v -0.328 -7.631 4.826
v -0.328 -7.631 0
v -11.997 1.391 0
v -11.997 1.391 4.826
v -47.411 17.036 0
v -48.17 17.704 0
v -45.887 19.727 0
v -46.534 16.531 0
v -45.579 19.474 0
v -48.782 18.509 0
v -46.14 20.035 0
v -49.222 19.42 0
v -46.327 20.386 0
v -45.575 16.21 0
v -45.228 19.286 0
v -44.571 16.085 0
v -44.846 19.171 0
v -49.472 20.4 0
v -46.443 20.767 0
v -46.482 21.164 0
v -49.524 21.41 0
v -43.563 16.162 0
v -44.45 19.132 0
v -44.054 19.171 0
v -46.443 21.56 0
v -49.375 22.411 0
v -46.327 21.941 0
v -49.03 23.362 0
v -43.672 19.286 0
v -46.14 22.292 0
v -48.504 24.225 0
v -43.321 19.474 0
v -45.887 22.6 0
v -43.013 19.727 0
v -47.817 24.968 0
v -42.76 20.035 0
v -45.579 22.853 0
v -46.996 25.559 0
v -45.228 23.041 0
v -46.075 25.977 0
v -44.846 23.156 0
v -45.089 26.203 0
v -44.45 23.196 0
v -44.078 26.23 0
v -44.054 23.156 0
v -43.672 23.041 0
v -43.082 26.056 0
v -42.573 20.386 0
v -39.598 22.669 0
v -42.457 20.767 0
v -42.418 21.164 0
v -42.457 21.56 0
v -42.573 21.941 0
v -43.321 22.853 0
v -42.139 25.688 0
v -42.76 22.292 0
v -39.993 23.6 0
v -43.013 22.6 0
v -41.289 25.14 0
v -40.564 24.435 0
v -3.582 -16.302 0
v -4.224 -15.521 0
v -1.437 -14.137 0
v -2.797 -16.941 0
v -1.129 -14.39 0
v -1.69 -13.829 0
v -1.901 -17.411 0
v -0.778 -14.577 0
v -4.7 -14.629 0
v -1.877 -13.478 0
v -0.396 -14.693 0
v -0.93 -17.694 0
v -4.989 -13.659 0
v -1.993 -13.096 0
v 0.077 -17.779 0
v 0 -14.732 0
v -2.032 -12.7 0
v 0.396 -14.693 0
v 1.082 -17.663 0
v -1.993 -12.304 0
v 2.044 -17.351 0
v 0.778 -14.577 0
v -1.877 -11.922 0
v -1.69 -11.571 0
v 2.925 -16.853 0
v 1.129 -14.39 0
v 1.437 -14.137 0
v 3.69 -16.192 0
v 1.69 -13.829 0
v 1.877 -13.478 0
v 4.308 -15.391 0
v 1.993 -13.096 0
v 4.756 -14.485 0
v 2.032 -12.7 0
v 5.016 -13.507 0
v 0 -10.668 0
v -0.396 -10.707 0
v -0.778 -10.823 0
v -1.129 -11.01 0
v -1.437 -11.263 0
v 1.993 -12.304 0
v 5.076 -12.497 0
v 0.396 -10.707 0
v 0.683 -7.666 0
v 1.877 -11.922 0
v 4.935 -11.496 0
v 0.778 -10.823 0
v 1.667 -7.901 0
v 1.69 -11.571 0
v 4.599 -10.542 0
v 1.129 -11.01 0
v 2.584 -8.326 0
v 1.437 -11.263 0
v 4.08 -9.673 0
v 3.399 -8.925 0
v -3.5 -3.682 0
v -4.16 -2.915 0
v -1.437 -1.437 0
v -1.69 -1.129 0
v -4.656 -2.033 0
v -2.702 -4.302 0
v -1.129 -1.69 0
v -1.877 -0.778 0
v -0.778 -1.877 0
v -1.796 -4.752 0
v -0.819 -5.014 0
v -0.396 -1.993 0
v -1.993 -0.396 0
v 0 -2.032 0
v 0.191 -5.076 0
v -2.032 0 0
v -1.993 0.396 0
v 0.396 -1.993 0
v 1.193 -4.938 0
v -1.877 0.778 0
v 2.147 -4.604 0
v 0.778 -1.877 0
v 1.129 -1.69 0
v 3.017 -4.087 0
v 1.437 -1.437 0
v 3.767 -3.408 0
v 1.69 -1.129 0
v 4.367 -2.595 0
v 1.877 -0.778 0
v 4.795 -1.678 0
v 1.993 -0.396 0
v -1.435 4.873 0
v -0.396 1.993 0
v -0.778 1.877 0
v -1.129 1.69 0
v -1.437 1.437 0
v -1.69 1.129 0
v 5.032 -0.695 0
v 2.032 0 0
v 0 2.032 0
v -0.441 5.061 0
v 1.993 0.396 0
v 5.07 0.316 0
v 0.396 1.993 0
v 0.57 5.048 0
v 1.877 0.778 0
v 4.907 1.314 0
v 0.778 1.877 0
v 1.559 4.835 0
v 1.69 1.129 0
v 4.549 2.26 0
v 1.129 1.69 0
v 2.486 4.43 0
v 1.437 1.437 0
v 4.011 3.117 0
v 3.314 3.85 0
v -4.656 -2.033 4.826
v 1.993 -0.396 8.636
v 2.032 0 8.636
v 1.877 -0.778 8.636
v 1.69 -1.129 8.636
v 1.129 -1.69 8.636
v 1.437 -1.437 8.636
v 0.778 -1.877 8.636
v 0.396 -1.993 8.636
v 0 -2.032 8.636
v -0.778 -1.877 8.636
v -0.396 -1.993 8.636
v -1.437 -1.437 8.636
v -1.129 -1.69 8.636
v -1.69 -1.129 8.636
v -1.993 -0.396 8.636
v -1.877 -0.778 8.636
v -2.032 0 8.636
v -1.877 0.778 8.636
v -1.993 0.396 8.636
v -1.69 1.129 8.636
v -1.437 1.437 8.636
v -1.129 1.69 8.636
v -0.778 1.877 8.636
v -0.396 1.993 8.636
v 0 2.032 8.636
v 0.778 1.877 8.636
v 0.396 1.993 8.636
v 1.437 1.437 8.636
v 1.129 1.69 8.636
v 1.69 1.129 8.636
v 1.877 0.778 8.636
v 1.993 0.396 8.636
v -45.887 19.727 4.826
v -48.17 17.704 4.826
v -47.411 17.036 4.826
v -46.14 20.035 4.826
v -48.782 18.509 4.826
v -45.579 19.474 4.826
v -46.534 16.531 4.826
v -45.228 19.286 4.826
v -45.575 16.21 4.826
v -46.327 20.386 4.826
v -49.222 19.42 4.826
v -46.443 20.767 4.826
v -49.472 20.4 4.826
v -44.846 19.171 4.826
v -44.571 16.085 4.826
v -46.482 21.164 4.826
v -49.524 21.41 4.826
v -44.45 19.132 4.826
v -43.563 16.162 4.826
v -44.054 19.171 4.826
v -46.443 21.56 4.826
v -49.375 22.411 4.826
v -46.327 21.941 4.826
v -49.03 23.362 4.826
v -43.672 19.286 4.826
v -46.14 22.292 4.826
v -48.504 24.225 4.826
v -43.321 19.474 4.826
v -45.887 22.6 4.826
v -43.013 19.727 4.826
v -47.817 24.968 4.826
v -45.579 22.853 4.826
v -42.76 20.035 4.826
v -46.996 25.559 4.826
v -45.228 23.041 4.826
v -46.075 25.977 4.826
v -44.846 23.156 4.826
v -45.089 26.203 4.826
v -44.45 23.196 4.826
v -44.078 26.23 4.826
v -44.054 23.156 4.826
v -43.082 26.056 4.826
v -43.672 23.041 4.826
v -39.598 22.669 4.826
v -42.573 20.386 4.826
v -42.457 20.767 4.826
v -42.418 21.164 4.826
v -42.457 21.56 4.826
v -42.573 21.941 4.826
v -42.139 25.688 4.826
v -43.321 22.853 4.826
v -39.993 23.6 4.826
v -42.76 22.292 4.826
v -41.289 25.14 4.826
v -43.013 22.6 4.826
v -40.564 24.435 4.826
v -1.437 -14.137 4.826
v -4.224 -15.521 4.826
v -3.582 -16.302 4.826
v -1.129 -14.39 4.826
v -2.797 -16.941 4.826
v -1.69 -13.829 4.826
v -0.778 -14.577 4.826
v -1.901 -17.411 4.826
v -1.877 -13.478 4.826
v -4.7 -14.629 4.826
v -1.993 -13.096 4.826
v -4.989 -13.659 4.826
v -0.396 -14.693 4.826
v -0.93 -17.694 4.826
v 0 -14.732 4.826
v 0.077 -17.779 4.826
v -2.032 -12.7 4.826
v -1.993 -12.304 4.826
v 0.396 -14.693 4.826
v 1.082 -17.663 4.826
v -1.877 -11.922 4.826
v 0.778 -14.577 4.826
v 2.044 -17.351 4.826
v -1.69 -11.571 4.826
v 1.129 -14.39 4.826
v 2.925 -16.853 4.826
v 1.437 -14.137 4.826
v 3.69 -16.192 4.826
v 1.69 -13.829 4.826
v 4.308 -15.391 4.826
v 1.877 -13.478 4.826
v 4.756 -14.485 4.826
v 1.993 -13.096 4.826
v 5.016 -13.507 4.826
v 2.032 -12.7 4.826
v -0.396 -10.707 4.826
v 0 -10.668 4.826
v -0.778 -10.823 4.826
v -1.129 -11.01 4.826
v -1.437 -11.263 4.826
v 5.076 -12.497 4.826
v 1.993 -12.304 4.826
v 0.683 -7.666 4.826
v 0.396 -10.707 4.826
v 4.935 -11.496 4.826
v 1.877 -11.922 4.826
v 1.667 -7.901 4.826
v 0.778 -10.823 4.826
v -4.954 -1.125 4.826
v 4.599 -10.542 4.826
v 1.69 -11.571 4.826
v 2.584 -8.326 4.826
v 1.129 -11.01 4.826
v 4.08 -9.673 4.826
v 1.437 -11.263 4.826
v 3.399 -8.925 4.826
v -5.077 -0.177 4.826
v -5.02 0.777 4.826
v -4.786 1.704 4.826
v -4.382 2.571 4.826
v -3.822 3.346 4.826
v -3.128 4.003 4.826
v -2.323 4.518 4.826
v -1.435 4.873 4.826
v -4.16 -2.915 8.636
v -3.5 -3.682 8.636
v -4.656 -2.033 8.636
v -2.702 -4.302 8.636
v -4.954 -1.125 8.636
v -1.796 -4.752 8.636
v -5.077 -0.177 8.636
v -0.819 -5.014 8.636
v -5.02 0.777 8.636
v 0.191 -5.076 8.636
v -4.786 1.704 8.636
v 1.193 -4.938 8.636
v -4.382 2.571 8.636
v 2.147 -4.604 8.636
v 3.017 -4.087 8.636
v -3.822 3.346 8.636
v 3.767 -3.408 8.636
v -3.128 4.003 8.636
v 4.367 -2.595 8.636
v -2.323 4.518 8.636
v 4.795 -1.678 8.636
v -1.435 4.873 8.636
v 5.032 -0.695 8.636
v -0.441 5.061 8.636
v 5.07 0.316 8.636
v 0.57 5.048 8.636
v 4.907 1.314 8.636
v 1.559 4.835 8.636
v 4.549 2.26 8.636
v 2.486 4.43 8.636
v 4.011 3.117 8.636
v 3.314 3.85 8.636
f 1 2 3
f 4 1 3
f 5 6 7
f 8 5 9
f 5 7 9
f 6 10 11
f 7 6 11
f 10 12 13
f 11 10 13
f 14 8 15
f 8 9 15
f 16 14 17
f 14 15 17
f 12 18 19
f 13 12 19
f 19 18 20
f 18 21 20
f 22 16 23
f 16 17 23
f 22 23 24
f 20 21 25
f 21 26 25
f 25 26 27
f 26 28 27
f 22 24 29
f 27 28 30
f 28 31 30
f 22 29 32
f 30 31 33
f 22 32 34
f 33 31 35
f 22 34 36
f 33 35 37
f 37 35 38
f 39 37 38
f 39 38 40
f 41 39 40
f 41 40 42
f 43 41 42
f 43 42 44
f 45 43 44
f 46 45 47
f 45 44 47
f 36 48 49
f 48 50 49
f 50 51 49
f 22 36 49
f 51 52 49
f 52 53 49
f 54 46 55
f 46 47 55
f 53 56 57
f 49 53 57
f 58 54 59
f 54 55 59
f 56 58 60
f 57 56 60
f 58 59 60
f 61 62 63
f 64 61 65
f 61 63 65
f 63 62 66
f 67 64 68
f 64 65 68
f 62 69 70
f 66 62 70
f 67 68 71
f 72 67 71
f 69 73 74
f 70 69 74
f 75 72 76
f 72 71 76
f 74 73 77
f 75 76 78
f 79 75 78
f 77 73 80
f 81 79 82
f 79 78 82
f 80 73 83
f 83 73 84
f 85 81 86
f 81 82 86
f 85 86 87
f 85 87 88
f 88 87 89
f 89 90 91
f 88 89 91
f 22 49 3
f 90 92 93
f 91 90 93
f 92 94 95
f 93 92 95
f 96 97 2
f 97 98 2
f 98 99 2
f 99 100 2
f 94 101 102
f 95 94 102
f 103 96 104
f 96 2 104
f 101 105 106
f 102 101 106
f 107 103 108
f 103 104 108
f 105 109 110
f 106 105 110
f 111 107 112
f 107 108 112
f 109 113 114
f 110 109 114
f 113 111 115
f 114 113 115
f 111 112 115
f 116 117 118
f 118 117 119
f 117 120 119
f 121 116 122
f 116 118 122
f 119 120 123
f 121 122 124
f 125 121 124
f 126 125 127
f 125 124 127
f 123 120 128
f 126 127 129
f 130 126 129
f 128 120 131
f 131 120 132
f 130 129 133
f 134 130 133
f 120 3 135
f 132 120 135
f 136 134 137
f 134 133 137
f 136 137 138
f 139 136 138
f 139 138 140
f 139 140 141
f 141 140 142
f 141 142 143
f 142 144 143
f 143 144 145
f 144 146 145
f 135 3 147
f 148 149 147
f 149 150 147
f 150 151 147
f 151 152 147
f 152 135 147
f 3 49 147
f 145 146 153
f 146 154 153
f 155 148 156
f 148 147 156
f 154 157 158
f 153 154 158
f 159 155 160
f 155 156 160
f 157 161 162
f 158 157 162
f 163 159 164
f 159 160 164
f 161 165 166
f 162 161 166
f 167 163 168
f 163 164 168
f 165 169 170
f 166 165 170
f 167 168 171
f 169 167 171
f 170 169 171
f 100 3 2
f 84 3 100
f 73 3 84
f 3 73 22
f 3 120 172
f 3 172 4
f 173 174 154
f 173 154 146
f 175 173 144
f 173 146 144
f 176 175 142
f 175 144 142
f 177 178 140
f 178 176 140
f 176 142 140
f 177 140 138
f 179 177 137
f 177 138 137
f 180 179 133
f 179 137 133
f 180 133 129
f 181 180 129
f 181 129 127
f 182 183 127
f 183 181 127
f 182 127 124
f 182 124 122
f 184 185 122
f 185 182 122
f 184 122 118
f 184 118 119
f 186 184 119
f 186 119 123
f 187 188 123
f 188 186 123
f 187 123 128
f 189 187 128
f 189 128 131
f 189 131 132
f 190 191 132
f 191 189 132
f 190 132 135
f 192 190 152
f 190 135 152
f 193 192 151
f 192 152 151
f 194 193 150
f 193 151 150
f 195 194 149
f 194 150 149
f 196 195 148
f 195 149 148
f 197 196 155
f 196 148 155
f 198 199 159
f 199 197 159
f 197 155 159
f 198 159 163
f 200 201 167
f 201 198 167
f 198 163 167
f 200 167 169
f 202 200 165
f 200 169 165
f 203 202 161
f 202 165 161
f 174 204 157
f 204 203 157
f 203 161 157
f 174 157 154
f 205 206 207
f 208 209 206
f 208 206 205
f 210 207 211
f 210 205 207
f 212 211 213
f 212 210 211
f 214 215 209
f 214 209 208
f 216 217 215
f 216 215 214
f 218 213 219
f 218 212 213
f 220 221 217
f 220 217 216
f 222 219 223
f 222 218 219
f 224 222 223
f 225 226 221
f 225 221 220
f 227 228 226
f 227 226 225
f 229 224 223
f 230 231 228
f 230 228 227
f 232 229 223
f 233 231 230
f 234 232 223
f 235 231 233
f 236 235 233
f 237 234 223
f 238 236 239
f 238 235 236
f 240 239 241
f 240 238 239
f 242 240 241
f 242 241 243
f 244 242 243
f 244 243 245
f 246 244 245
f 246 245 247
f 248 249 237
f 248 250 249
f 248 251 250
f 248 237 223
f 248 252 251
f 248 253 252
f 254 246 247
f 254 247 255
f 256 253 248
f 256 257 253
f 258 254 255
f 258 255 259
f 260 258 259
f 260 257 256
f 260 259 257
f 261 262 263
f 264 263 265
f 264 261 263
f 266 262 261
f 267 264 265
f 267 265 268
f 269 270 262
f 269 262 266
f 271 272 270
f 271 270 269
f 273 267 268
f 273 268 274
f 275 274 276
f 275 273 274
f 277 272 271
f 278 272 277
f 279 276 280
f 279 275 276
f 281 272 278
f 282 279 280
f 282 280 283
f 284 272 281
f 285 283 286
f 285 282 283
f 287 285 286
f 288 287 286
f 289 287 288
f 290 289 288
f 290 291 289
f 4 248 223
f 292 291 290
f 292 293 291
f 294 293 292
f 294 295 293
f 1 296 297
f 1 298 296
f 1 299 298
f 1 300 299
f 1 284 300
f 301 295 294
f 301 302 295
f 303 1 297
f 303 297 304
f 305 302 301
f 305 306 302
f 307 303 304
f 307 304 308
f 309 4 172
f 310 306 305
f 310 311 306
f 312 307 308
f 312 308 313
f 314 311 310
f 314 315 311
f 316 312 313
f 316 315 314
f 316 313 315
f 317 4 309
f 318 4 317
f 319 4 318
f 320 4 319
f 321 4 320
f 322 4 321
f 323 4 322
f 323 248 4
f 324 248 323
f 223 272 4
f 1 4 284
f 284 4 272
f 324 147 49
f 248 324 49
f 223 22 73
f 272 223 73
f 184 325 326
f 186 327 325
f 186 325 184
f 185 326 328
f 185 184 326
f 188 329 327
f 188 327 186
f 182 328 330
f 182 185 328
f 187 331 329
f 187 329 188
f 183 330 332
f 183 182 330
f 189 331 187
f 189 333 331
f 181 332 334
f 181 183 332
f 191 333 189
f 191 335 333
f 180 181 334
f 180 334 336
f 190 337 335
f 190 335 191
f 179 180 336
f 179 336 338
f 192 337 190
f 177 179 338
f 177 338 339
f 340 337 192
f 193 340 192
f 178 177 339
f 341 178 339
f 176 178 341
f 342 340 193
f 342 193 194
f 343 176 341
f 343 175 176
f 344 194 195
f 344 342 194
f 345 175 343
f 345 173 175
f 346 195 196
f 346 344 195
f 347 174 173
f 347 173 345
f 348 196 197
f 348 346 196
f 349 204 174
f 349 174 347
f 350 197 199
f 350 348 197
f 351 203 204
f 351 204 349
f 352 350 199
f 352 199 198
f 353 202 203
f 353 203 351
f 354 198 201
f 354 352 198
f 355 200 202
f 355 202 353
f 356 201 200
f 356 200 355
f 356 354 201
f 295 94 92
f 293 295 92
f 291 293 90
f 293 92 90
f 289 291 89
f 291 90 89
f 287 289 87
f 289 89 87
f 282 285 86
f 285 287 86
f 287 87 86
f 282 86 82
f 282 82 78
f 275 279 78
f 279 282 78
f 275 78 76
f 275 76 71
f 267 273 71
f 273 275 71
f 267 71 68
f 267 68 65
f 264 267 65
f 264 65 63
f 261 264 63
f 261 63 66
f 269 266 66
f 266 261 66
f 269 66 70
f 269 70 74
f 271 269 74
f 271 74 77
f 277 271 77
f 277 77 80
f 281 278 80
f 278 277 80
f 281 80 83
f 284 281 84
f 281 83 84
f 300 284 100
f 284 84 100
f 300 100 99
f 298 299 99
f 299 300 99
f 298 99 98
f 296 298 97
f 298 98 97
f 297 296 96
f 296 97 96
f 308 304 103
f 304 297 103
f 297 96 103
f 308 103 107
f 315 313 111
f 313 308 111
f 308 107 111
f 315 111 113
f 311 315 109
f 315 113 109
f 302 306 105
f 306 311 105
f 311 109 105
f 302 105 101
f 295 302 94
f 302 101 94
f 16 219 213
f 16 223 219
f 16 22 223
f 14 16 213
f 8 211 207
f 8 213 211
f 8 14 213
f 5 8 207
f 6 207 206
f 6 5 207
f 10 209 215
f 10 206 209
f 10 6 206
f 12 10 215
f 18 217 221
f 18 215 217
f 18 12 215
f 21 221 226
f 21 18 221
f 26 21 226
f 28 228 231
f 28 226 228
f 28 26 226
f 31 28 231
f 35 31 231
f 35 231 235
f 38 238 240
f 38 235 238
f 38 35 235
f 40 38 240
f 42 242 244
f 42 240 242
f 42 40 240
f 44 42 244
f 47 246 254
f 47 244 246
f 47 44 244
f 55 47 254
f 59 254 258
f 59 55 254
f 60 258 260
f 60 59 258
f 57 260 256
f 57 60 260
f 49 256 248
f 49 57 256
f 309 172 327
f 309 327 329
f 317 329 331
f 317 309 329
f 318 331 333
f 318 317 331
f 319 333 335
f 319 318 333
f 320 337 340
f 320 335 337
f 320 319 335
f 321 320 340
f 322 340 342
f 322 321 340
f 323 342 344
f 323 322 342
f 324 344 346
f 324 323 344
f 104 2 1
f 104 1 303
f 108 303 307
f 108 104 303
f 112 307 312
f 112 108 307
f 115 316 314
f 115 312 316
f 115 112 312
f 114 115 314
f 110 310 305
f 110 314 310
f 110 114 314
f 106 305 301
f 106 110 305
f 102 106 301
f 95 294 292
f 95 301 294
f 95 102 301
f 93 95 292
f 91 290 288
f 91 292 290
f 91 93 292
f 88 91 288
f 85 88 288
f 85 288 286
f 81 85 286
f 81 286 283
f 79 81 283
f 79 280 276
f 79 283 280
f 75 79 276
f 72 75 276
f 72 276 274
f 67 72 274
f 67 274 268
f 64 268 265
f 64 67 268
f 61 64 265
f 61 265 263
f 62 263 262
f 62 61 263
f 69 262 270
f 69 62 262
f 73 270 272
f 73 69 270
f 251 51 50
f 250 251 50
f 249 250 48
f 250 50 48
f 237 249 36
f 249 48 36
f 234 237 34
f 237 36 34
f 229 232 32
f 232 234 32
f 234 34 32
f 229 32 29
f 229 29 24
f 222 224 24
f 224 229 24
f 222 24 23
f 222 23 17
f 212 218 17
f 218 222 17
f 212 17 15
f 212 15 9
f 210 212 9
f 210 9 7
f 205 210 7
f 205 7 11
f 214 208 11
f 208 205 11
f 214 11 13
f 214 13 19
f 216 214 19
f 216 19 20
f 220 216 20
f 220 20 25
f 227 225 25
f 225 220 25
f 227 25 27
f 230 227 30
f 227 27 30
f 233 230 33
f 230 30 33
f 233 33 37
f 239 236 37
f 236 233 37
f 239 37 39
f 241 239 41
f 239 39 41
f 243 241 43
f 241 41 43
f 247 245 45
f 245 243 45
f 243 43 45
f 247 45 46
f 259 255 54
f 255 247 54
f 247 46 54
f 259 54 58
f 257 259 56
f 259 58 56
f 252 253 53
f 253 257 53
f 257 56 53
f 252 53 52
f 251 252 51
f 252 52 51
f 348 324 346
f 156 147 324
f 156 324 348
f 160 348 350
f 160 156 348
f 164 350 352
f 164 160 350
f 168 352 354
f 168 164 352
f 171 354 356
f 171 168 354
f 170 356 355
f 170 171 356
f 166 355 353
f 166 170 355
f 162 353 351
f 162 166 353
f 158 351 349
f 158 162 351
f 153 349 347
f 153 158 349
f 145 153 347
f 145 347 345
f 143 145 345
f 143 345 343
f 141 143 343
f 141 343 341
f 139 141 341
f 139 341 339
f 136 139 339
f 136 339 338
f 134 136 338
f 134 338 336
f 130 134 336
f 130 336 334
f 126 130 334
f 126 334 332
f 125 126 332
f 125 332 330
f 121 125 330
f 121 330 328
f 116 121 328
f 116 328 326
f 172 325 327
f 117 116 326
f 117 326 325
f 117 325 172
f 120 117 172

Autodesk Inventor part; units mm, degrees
ref_plane "YZ Plane" through (0, 0, 0) normal (1, 0, 0) x (0, 1, 0)
ref_plane "XZ Plane" through (0, 0, 0) normal (0, 1, 0) x (-1, 0, 0)
ref_plane "XY Plane" through (0, 0, 0) normal (0, 0, 1) x (1, 0, 0)
sketch "Sketch1" plane through (0, 0, 0) normal (0, 0, 1) x (1, 0, 0)
  arc A0 (-4.6555, -2.033) -> (-1.4351, 4.8731) centre (0, 0) ccw
  circle A1 centre (0, 0) radius 2.032
  arc A2 (-4.9886, -13.6592) -> (-0.3281, -7.6306) centre (0, -12.7) ccw
  circle A3 centre (0, -12.7) radius 2.032
  line L0 (-43.5629, 16.1615) -> (-4.9886, -13.6592)
  line L1 (-0.3281, -7.6306) -> (-11.9974, 1.3906)
  line L2 (-1.4351, 4.8731) -> (-39.5982, 22.6688)
  arc A4 (-39.5982, 22.6688) -> (-43.5629, 16.1615) centre (-44.45, 21.1635) ccw
  circle A5 centre (-44.45, 21.1635) radius 2.032
  line L3 (-39.5982, 22.6688) -> (-46.4155, 25.8478) construction
  line L4 (-43.5629, 16.1615) -> (-49.5141, 20.7622) construction
  line L5 (-4.6555, -2.033) -> (-11.9974, 1.3906)
  line L6 (0, 0) -> (25.4, 0) construction
  point P0 (-4.1501, -2.9296)
  point P1 (-3.0659, -4.0505)
  dimension "d0" = 10.16
  dimension "d1" = 4.064
  dimension "d7" = 10.16
  dimension "d8" = 4.064
  dimension "d9" = 12.7
  dimension "d10" = 7.62
  dimension "d11" = 3.81
  dimension "d20" = 10.16
  dimension "d21" = 4.064
  dimension "d25" = 7.62
  dimension "d29" = 44.45
  dimension "d30" = 7.62
  dimension "d31" = 3.81
  dimension "d32" = 25.4
  dimension "d33" = 25
extrude "Extrusion1" add sketch "Sketch1" along normal blind 4.826
sketch "Sketch4" plane through (0, 0, 4.826) normal (0, 0, 1) x (1, 0, 0)
  arc A0 (-4.6555, -2.033) -> (-1.4351, 4.8731) centre (0, 0) ccw projected
  circle A1 centre (0, 0) radius 2.032 projected
  circle A2 centre (0, 0) radius 5.08
  point P0 (-1.4351, 4.8731)
  point P1 (-3.0659, -4.0505)
  point P2 (5.08, 0)
  point P3 (-1.4351, 4.8731)
extrude "Extrusion4" add sketch "Sketch4" along normal blind 3.81
equation "\"d8\" = d1"
equation "\"d11\" = 0.5 * d10"
properties part number "Tip Arm 2"
